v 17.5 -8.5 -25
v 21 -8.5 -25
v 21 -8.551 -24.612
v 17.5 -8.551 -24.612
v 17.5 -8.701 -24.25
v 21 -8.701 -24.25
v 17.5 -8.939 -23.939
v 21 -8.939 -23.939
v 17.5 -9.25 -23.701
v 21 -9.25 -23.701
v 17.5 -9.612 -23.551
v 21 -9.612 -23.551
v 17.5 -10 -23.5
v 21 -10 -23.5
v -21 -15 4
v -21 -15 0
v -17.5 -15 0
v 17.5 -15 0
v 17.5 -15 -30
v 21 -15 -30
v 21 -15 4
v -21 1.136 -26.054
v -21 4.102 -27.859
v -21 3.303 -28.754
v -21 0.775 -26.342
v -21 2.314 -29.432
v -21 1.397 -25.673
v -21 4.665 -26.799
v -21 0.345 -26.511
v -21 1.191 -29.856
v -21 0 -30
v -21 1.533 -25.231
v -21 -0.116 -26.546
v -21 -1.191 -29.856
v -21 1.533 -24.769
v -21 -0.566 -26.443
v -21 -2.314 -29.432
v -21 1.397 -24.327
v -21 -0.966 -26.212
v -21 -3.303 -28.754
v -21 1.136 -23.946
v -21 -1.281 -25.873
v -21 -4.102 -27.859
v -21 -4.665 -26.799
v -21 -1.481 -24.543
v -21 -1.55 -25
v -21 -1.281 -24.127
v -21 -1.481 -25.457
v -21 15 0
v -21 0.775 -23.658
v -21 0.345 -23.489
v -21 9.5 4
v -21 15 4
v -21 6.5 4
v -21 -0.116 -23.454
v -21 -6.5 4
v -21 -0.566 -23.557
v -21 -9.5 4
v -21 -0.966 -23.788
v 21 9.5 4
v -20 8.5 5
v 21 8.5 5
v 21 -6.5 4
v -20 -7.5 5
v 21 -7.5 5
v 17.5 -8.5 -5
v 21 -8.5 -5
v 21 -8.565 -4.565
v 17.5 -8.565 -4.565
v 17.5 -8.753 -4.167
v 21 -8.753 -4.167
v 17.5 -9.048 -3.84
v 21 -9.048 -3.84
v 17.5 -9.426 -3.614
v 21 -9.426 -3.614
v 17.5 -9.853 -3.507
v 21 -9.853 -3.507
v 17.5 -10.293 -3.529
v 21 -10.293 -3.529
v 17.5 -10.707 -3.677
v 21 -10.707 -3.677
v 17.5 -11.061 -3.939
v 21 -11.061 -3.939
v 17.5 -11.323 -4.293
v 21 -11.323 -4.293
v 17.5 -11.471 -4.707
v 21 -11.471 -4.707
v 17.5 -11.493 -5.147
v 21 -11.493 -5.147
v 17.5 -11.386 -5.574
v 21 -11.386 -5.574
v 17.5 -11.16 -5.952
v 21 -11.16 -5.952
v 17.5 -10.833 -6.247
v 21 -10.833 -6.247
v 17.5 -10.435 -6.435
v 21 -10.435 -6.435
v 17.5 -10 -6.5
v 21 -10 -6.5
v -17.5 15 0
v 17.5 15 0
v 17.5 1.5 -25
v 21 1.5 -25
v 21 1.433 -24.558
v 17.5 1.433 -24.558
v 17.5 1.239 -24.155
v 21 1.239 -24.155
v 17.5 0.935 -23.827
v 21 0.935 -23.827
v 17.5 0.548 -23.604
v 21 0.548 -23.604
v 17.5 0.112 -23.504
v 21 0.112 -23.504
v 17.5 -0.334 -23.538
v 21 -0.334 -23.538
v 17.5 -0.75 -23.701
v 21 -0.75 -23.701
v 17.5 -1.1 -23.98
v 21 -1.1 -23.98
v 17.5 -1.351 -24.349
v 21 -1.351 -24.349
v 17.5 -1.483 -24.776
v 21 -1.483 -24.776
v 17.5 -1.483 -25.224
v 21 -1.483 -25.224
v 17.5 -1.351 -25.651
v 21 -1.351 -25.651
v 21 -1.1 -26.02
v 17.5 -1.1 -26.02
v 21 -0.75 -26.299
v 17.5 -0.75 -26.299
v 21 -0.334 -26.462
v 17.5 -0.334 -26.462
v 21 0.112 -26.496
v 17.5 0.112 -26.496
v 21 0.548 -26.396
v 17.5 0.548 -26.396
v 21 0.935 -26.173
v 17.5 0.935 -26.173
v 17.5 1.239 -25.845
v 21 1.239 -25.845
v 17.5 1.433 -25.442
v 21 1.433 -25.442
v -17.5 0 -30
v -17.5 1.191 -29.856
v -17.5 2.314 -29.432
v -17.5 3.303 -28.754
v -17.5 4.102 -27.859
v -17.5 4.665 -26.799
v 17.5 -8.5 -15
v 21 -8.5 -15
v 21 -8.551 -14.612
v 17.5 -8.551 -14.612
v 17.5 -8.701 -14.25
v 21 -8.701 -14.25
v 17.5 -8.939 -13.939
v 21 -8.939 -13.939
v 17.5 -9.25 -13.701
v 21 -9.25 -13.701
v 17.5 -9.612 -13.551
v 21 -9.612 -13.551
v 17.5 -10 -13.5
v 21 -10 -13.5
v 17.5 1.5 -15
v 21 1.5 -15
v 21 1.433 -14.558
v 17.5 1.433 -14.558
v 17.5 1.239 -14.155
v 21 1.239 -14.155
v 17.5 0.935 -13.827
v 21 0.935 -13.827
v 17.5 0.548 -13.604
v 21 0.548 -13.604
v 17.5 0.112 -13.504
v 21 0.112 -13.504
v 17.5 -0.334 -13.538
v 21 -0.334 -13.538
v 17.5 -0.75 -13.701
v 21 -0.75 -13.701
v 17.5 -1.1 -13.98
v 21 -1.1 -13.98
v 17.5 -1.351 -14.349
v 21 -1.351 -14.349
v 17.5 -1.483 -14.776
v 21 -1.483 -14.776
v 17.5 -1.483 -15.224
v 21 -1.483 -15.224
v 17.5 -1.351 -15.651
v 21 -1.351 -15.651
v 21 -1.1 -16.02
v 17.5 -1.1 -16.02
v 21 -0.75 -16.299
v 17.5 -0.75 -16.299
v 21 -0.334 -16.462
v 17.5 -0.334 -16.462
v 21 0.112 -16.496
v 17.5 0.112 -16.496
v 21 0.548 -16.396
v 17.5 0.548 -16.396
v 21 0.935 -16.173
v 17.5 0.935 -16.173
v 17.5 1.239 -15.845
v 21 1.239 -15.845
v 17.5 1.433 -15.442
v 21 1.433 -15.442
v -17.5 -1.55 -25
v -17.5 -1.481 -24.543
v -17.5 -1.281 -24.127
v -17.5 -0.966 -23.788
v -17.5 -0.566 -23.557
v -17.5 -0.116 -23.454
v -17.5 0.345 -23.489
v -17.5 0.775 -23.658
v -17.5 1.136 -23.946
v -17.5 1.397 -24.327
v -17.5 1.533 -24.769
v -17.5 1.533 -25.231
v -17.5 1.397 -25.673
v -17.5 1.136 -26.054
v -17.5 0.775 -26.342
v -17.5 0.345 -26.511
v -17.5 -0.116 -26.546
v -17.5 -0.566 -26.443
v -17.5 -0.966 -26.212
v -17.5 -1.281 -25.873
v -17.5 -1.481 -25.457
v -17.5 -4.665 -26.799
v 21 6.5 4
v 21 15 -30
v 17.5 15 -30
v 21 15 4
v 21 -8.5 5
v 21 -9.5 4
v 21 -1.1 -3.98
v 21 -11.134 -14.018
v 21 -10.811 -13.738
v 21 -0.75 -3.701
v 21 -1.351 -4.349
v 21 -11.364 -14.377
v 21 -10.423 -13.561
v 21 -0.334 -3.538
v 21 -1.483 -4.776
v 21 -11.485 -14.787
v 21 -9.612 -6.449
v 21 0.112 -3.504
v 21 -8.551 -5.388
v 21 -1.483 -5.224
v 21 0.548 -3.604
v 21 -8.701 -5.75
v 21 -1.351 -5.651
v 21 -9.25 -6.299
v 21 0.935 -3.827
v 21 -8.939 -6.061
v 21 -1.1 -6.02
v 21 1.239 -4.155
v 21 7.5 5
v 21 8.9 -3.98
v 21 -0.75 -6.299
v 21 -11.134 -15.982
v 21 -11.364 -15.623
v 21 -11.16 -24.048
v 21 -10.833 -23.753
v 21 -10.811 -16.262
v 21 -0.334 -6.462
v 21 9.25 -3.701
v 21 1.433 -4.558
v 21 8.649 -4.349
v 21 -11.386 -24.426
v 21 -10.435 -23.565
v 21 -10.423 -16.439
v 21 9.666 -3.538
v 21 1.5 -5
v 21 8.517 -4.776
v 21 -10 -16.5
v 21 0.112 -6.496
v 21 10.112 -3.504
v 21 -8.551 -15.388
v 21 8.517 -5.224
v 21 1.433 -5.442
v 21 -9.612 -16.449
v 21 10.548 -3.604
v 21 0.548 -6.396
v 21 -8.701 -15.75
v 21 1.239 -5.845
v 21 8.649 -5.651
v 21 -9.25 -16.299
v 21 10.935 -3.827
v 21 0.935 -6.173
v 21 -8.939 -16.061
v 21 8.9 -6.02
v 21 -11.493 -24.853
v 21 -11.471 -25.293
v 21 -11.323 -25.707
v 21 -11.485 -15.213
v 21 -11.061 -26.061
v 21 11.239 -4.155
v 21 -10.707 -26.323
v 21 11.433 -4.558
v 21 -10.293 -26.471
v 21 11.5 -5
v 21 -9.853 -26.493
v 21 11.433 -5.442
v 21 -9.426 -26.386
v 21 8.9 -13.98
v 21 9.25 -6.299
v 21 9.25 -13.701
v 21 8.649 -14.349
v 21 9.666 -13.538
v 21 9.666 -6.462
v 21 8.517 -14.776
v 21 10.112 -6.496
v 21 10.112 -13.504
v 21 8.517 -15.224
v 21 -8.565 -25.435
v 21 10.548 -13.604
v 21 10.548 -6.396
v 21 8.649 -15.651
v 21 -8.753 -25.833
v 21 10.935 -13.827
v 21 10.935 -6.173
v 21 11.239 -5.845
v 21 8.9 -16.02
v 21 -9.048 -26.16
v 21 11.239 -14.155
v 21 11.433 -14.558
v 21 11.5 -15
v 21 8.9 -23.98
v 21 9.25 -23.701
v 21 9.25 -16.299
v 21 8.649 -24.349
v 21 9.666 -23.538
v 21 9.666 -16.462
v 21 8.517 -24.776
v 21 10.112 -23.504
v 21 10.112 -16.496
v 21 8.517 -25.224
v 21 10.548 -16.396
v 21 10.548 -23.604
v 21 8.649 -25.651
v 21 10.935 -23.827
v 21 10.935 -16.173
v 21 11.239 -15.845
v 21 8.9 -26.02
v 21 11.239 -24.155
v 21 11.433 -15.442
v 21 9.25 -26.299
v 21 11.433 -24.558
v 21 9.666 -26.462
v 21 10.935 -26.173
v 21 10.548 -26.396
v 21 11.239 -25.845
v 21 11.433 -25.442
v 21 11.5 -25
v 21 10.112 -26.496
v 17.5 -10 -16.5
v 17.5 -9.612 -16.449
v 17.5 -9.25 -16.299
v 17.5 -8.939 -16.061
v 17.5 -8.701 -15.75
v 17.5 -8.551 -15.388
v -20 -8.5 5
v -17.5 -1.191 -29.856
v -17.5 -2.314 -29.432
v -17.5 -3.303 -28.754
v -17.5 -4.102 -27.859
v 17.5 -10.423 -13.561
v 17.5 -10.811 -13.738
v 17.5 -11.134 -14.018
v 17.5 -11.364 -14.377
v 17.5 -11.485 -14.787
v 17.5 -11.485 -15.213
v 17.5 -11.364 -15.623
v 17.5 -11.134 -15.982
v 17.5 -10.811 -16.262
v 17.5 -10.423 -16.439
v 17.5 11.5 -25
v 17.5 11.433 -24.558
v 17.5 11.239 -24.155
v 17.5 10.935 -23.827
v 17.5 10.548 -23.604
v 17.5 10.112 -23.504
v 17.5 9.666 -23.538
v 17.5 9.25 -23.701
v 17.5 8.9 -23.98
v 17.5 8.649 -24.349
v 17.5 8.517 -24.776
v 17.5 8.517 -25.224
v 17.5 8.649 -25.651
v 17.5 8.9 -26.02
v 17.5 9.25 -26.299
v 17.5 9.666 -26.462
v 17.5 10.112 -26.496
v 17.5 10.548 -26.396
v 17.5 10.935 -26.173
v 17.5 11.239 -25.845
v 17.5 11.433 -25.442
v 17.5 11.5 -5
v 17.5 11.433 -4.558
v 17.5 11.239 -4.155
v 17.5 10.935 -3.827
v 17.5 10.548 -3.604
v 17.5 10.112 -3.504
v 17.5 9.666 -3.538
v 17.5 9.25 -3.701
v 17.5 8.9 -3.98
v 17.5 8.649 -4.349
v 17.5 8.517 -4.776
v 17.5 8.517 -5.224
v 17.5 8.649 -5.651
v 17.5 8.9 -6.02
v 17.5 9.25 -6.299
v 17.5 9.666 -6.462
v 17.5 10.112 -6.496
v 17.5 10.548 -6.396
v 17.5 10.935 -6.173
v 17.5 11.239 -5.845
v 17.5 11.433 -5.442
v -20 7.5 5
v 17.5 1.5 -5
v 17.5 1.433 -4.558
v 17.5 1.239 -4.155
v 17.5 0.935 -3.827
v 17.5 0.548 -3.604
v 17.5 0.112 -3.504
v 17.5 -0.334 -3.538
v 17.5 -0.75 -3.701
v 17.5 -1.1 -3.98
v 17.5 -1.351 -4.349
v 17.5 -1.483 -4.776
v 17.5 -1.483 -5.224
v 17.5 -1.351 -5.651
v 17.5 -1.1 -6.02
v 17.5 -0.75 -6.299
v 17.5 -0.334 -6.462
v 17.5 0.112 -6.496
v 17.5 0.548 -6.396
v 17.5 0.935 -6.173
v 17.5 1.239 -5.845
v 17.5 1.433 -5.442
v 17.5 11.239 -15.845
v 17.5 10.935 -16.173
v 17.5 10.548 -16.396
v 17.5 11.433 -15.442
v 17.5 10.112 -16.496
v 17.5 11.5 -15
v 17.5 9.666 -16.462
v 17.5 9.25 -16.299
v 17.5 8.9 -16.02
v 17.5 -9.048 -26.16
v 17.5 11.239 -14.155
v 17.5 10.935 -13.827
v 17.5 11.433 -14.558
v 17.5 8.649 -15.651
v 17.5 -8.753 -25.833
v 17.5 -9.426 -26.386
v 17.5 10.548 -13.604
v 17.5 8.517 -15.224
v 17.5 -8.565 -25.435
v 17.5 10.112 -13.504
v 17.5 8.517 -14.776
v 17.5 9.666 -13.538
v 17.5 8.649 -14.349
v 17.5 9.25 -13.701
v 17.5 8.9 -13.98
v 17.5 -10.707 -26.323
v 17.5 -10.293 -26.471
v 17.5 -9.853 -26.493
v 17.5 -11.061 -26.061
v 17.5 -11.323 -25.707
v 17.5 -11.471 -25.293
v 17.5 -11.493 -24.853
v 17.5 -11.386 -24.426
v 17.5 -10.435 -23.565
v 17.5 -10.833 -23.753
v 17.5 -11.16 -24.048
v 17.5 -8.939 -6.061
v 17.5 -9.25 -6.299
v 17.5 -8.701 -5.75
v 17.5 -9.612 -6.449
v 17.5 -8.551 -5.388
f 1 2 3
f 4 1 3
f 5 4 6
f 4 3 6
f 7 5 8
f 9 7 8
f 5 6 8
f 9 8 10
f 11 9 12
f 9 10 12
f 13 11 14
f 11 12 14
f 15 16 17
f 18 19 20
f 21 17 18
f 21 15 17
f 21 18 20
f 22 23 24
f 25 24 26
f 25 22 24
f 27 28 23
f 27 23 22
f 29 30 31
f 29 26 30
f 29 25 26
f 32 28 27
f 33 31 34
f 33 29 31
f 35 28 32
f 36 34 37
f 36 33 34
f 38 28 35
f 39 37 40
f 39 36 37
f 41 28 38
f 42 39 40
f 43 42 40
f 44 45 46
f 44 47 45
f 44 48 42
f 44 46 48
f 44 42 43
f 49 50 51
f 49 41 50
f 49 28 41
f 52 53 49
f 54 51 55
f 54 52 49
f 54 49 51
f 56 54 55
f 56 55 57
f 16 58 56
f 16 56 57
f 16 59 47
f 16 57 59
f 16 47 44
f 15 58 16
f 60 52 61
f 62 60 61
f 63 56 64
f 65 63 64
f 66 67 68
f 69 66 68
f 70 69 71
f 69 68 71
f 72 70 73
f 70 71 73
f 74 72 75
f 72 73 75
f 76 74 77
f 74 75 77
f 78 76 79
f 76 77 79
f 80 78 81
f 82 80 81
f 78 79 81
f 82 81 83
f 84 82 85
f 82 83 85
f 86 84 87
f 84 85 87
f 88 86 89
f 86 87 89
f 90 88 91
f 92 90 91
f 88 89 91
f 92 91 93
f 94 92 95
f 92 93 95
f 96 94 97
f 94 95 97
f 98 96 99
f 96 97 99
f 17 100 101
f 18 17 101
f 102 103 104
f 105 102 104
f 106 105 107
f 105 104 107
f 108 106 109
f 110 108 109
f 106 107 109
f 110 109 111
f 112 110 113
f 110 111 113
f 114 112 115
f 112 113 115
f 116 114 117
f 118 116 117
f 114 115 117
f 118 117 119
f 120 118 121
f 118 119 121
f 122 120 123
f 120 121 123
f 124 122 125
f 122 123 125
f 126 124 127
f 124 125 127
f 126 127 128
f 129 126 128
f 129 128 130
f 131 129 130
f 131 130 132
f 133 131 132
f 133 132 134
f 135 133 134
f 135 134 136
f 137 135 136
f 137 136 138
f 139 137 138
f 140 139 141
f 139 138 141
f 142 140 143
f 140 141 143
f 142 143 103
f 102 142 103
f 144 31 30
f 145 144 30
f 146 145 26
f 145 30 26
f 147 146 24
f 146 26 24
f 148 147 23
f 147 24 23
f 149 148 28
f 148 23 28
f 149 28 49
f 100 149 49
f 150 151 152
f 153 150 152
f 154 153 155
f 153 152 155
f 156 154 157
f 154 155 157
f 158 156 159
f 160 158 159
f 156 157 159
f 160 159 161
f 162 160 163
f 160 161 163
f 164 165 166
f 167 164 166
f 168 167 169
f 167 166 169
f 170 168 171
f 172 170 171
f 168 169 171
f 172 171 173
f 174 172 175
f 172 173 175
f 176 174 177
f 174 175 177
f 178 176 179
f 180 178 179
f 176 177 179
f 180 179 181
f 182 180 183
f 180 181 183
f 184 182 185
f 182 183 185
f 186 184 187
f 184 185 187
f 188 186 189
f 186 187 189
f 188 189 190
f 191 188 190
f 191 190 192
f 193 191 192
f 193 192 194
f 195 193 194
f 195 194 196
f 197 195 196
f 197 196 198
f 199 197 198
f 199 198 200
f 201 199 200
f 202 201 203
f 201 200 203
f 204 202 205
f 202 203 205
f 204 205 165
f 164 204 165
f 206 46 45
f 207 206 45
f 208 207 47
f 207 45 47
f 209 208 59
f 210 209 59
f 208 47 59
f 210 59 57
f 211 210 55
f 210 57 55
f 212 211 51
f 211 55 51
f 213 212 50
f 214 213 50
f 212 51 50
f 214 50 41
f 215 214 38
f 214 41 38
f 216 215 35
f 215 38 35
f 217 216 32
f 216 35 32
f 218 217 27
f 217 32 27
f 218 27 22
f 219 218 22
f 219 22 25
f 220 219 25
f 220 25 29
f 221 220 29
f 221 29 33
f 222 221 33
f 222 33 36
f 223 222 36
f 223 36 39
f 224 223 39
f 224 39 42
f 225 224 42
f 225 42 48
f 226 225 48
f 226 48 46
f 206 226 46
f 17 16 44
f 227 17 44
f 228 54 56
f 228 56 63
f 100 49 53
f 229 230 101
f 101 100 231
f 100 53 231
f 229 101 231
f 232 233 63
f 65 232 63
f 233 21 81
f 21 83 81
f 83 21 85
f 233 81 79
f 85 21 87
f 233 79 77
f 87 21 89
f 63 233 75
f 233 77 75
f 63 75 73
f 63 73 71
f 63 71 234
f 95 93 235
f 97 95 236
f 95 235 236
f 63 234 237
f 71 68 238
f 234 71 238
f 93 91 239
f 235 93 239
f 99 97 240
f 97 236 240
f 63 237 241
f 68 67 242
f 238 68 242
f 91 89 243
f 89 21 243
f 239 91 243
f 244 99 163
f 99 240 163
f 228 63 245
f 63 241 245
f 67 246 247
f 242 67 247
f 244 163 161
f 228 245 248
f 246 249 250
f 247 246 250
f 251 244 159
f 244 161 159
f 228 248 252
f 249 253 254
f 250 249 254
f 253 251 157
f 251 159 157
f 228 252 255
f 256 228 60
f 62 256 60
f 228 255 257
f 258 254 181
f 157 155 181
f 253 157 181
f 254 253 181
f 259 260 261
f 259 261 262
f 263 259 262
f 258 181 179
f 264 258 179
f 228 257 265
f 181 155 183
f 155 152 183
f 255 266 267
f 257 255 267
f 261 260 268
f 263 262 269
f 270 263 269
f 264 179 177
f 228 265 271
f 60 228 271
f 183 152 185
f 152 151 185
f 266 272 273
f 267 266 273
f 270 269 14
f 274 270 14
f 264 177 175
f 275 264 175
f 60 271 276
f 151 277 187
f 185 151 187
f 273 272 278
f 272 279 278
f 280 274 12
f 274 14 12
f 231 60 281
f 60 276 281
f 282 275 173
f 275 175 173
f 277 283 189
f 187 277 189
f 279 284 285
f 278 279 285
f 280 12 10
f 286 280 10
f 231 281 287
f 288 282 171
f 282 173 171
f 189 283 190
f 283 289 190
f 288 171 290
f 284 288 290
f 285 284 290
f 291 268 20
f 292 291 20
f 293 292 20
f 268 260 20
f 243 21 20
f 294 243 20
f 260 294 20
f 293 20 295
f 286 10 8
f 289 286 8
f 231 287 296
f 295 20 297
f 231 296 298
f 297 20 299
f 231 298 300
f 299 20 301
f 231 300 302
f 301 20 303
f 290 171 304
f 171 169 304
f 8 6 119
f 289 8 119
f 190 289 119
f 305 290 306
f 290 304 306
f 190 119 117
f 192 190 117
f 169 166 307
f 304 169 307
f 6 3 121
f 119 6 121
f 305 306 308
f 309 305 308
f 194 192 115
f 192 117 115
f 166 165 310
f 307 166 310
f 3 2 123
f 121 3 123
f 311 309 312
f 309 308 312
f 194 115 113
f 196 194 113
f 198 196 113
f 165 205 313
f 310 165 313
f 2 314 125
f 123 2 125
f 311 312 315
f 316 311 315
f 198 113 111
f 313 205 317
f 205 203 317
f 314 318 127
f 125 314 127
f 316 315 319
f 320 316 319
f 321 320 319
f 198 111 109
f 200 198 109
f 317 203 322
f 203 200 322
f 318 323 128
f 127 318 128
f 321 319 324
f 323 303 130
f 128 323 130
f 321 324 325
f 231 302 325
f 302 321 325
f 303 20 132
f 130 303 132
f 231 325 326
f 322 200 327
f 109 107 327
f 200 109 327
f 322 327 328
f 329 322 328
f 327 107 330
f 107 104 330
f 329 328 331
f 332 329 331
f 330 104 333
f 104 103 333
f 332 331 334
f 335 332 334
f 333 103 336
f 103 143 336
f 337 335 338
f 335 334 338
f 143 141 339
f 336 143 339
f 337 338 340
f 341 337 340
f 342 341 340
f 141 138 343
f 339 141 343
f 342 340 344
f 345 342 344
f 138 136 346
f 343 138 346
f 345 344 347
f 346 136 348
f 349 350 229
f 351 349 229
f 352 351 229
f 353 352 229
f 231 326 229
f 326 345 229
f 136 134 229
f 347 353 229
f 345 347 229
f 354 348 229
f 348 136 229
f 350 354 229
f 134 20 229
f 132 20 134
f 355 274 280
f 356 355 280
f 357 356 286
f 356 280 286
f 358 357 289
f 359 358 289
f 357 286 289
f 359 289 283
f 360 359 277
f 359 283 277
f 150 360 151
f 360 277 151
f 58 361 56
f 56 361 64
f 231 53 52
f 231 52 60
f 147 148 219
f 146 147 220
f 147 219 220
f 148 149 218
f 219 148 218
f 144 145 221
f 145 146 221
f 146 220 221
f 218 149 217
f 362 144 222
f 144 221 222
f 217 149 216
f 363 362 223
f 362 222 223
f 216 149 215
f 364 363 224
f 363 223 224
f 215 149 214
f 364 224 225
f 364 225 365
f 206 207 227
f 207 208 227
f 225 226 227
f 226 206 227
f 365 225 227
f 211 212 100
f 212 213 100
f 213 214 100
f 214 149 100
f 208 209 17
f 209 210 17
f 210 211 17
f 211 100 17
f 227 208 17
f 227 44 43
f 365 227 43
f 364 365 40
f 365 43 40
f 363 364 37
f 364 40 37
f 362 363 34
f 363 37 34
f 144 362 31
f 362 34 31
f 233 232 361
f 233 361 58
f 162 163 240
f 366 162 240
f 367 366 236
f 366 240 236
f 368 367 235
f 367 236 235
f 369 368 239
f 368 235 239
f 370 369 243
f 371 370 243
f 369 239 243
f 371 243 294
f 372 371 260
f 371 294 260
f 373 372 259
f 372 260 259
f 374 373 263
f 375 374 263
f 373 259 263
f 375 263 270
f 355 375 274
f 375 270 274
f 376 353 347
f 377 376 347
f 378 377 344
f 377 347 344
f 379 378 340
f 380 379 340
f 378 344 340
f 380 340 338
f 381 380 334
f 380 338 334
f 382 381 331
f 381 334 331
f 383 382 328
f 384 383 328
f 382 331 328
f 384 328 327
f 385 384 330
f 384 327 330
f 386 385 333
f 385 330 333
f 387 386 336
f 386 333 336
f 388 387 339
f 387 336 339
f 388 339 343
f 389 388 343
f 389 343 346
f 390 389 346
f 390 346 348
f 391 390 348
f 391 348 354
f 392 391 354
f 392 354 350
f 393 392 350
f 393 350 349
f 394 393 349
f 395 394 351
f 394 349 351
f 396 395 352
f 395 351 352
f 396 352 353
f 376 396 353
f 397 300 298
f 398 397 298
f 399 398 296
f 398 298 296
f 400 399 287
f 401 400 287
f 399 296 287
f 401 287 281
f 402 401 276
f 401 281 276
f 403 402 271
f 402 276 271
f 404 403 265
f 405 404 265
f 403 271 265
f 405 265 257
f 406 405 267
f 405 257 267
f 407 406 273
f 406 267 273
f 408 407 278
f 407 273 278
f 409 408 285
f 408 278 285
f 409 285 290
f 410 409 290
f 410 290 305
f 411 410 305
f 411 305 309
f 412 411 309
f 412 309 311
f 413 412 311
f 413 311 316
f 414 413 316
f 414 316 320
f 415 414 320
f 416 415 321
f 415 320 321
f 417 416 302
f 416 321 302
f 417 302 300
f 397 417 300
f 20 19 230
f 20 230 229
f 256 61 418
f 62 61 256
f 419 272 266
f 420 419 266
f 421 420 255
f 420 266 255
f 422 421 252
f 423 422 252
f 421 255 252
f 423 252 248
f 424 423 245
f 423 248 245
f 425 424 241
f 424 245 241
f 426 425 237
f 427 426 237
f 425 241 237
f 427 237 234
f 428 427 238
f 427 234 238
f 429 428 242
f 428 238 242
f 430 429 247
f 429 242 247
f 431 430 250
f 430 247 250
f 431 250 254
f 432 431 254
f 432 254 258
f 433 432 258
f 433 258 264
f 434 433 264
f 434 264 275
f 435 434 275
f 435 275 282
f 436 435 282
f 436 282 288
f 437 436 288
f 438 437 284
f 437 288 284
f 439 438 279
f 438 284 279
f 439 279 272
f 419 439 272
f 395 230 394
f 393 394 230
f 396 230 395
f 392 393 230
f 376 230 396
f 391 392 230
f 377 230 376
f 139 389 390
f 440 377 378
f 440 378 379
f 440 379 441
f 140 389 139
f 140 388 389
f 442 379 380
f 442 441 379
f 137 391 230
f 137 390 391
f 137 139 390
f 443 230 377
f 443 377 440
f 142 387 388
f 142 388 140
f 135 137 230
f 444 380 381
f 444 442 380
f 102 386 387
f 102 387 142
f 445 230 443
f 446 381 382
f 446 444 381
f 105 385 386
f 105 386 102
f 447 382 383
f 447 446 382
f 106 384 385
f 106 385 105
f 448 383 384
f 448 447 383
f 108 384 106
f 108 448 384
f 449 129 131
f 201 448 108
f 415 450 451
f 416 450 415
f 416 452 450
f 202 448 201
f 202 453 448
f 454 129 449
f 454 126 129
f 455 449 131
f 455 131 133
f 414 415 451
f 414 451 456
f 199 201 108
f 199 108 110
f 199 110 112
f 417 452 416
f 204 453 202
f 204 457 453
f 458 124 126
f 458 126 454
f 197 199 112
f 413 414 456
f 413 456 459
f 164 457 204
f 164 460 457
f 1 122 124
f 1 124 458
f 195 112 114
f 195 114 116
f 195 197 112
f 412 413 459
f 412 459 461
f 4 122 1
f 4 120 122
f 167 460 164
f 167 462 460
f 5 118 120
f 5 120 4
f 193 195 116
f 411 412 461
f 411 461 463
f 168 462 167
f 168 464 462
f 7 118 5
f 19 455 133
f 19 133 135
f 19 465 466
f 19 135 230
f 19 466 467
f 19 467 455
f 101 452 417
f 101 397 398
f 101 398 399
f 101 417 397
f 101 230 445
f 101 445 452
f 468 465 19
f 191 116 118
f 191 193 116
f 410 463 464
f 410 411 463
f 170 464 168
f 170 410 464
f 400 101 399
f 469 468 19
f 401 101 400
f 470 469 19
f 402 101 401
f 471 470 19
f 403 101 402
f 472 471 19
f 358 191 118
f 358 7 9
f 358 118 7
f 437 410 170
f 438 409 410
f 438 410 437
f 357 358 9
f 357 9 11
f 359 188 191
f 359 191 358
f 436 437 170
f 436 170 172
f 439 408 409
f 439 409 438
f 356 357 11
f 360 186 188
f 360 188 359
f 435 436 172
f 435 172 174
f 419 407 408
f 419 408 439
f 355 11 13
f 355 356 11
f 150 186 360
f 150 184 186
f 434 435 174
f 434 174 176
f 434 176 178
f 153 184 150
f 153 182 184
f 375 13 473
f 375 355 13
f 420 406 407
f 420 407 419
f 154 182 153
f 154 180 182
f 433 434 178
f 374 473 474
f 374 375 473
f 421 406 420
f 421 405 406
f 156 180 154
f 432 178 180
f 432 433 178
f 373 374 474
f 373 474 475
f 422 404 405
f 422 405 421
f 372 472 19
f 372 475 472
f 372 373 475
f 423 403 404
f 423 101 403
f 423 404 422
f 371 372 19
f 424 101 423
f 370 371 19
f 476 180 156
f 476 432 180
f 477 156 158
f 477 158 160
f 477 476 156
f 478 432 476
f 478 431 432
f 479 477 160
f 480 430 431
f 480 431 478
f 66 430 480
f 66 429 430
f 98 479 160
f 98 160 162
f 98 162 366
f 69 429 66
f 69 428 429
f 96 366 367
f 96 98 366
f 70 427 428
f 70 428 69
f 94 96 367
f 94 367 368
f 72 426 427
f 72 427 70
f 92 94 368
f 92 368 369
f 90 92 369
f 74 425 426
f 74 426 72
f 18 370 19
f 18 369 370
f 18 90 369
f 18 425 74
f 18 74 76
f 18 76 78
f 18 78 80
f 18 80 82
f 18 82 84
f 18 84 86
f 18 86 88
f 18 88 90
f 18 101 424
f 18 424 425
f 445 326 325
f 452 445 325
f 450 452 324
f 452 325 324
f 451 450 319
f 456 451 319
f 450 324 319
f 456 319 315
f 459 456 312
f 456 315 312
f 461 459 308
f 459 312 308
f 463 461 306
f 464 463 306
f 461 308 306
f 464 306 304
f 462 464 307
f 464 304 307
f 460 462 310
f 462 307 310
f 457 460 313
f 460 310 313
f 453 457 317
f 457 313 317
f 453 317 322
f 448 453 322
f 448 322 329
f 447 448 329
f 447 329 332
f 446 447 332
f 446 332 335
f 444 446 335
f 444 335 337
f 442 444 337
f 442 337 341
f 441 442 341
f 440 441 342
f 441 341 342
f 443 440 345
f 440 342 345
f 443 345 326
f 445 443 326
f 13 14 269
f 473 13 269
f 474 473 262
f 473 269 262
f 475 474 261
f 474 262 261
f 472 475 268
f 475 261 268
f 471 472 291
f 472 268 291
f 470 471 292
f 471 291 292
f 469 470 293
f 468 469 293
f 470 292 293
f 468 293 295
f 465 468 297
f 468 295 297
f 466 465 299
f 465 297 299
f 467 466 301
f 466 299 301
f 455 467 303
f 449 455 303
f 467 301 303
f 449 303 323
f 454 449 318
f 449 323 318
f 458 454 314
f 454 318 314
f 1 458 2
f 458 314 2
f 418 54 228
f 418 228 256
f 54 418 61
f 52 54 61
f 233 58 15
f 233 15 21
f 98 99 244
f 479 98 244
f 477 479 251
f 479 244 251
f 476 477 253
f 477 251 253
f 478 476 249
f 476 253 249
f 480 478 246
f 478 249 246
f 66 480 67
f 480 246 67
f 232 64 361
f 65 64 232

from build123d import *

# Parameters (mm, degrees)
F0_W          = 42
F0_H          = 30
F1_DEPTH      = 4
F2_W          = 3.5
F2_H          = 30
F3_DEPTH      = 30
F4_R          = 1.55
F5_DEPTH      = 5
F7_DEPTH      = 3.5
F8_W          = 42
F8_H          = 4
F9_DEPTH      = 1
F10_SIZE      = 1
F11_T4_DEPTH  = 48.7150489639
F11_T9_DEPTH  = 48.7150489639
F11_T14_DEPTH = 48.7150489639
F11_T19_DEPTH = 48.7150489639
F12_R         = 1.5
F13_DEPTH     = 3.5


# Not quite as in the source:
# - a fillet or chamfer that OpenCascade refuses, or shapes differently, is made with other operations: its cross-section is extruded or revolved along the edge and cut away or added


with BuildPart() as f1:
    # F0 (on Top) → F1 (new body)
    with BuildSketch(Plane.XY):
        Rectangle(F0_W, F0_H)
    extrude(amount=F1_DEPTH)

    # F2 (on face) → F3 (join)
    with BuildSketch(Plane(origin=(0, 0, 0), x_dir=(1, 0, 0), z_dir=(0, 0, -1))):
        with Locations((-19.25, 0)):
            Rectangle(F2_W, F2_H)
        with Locations((19.25, 0)):
            Rectangle(F2_W, F2_H)
    extrude(amount=F3_DEPTH)

    # F4 (on face) → F5 (cut)
    with BuildSketch(Plane(origin=(-21, 0, 0), x_dir=(0, -1, 0), z_dir=(-1, 0, 0))):
        with Locations((0, -25)):
            Circle(F4_R)
    extrude(amount=-F5_DEPTH, mode=Mode.SUBTRACT)

    # F6 (on face) → F7 (cut)
    with BuildSketch(Plane(origin=(-21, 0, 0), x_dir=(0, -1, 0), z_dir=(-1, 0, 0))):
        with BuildLine():
            ThreePointArc((0, -30), (-2.8288373248, -29.1228242007), (-4.665119593, -26.7990717558))
            Line((-4.665119593, -26.7990717558), (-15, 0))
            Line((-15, 0), (-15, -30))
            Line((-15, -30), (0, -30))
        make_face()
        with BuildLine():
            ThreePointArc((4.665119593, -26.7990717558), (2.8288373248, -29.1228242007), (0, -30))
            Line((0, -30), (15, -30))
            Line((15, -30), (15, 0))
            Line((15, 0), (4.665119593, -26.7990717558))
        make_face()
    extrude(amount=-F7_DEPTH, mode=Mode.SUBTRACT)

    # F8 (on face) → F9 (join)
    with BuildSketch(Plane.XY.offset(4)):
        with Locations((0, 8)):
            Rectangle(F8_W, F8_H)
        with Locations((0, -8)):
            Rectangle(F8_W, F8_H)
    extrude(amount=F9_DEPTH)

    # F10
    f10_edges = [f1.edges().sort_by_distance(p)[0] for p in [
        (-21, -8, 5),
        (-21, 8, 5),
    ]]
    chamfer(f10_edges, length=F10_SIZE)

    # F11: chamfer of 1.5 on 4 edges, made by hand


with BuildPart() as f11_tool2:
    # F11_s3 → F11_t4 (new body)
    with BuildSketch(Plane.YZ.offset(-23.8575244819)):
        Polygon((-8.5, 5), (-10, 3.5), (-10, 5), align=None)
    extrude(amount=F11_T4_DEPTH)

    split(bisect_by=Plane.XY.offset(4), keep=Keep.TOP)


with BuildPart() as f1_1:
    add(f1.part)

    # F11_t1: cut F11_tool2
    add(f11_tool2.part, mode=Mode.SUBTRACT)


with BuildPart() as f11_tool7:
    # F11_s8 → F11_t9 (new body)
    with BuildSketch(Plane.YZ.offset(24.8575244819)):
        Polygon((-6, 3.5), (-7.5, 5), (-6, 5), align=None)
    extrude(amount=-F11_T9_DEPTH)

    split(bisect_by=Plane.XY.offset(4), keep=Keep.TOP)


with BuildPart() as f1_2:
    add(f1_1.part)

    # F11_t6: cut F11_tool7
    add(f11_tool7.part, mode=Mode.SUBTRACT)


with BuildPart() as f11_tool12:
    # F11_s13 → F11_t14 (new body)
    with BuildSketch(Plane.YZ.offset(-23.8575244819)):
        Polygon((6, 3.5), (7.5, 5), (6, 5), align=None)
    extrude(amount=F11_T14_DEPTH)

    split(bisect_by=Plane.XY.offset(4), keep=Keep.TOP)


with BuildPart() as f1_3:
    add(f1_2.part)

    # F11_t11: cut F11_tool12
    add(f11_tool12.part, mode=Mode.SUBTRACT)


with BuildPart() as f11_tool17:
    # F11_s18 → F11_t19 (new body)
    with BuildSketch(Plane.YZ.offset(24.8575244819)):
        Polygon((10, 3.5), (8.5, 5), (10, 5), align=None)
    extrude(amount=-F11_T19_DEPTH)

    split(bisect_by=Plane.XY.offset(4), keep=Keep.TOP)


with BuildPart() as f1_4:
    add(f1_3.part)

    # F11_t16: cut F11_tool17
    add(f11_tool17.part, mode=Mode.SUBTRACT)

    # F12 (on face) → F13 (cut)
    with BuildSketch(Plane.YZ.offset(21)):
        with BuildLine():
            ThreePointArc((-10, -6.5), (-8.9393398282, -6.0606601718), (-8.5, -5))
            ThreePointArc((-8.5, -5), (-11.0606601718, -3.9393398282), (-10, -6.5))
        make_face()
        with BuildLine():
            ThreePointArc((-8.5, -25), (-8.9393398282, -23.9393398282), (-10, -23.5))
            ThreePointArc((-10, -23.5), (-11.0606601718, -26.0606601718), (-8.5, -25))
        make_face()
        with BuildLine():
            ThreePointArc((-8.5, -15), (-8.9393398282, -13.9393398282), (-10, -13.5))
            Line((-10, -13.5), (-10, -16.5))
            ThreePointArc((-10, -16.5), (-8.9393398282, -16.0606601718), (-8.5, -15))
        make_face()
        with BuildLine():
            Line((-10, -16.5), (-10, -13.5))
            ThreePointArc((-10, -13.5), (-11.5, -15), (-10, -16.5))
        make_face()
        with Locations((0, -5)):
            Circle(F12_R)
        with Locations((10, -5)):
            Circle(F12_R)
        with Locations((0, -15)):
            Circle(F12_R)
        with Locations((0, -25)):
            Circle(F12_R)
        with Locations((10, -15)):
            Circle(F12_R)
        with Locations((10, -25)):
            Circle(F12_R)
    extrude(amount=-F13_DEPTH, mode=Mode.SUBTRACT)


solid = f1_4.part
